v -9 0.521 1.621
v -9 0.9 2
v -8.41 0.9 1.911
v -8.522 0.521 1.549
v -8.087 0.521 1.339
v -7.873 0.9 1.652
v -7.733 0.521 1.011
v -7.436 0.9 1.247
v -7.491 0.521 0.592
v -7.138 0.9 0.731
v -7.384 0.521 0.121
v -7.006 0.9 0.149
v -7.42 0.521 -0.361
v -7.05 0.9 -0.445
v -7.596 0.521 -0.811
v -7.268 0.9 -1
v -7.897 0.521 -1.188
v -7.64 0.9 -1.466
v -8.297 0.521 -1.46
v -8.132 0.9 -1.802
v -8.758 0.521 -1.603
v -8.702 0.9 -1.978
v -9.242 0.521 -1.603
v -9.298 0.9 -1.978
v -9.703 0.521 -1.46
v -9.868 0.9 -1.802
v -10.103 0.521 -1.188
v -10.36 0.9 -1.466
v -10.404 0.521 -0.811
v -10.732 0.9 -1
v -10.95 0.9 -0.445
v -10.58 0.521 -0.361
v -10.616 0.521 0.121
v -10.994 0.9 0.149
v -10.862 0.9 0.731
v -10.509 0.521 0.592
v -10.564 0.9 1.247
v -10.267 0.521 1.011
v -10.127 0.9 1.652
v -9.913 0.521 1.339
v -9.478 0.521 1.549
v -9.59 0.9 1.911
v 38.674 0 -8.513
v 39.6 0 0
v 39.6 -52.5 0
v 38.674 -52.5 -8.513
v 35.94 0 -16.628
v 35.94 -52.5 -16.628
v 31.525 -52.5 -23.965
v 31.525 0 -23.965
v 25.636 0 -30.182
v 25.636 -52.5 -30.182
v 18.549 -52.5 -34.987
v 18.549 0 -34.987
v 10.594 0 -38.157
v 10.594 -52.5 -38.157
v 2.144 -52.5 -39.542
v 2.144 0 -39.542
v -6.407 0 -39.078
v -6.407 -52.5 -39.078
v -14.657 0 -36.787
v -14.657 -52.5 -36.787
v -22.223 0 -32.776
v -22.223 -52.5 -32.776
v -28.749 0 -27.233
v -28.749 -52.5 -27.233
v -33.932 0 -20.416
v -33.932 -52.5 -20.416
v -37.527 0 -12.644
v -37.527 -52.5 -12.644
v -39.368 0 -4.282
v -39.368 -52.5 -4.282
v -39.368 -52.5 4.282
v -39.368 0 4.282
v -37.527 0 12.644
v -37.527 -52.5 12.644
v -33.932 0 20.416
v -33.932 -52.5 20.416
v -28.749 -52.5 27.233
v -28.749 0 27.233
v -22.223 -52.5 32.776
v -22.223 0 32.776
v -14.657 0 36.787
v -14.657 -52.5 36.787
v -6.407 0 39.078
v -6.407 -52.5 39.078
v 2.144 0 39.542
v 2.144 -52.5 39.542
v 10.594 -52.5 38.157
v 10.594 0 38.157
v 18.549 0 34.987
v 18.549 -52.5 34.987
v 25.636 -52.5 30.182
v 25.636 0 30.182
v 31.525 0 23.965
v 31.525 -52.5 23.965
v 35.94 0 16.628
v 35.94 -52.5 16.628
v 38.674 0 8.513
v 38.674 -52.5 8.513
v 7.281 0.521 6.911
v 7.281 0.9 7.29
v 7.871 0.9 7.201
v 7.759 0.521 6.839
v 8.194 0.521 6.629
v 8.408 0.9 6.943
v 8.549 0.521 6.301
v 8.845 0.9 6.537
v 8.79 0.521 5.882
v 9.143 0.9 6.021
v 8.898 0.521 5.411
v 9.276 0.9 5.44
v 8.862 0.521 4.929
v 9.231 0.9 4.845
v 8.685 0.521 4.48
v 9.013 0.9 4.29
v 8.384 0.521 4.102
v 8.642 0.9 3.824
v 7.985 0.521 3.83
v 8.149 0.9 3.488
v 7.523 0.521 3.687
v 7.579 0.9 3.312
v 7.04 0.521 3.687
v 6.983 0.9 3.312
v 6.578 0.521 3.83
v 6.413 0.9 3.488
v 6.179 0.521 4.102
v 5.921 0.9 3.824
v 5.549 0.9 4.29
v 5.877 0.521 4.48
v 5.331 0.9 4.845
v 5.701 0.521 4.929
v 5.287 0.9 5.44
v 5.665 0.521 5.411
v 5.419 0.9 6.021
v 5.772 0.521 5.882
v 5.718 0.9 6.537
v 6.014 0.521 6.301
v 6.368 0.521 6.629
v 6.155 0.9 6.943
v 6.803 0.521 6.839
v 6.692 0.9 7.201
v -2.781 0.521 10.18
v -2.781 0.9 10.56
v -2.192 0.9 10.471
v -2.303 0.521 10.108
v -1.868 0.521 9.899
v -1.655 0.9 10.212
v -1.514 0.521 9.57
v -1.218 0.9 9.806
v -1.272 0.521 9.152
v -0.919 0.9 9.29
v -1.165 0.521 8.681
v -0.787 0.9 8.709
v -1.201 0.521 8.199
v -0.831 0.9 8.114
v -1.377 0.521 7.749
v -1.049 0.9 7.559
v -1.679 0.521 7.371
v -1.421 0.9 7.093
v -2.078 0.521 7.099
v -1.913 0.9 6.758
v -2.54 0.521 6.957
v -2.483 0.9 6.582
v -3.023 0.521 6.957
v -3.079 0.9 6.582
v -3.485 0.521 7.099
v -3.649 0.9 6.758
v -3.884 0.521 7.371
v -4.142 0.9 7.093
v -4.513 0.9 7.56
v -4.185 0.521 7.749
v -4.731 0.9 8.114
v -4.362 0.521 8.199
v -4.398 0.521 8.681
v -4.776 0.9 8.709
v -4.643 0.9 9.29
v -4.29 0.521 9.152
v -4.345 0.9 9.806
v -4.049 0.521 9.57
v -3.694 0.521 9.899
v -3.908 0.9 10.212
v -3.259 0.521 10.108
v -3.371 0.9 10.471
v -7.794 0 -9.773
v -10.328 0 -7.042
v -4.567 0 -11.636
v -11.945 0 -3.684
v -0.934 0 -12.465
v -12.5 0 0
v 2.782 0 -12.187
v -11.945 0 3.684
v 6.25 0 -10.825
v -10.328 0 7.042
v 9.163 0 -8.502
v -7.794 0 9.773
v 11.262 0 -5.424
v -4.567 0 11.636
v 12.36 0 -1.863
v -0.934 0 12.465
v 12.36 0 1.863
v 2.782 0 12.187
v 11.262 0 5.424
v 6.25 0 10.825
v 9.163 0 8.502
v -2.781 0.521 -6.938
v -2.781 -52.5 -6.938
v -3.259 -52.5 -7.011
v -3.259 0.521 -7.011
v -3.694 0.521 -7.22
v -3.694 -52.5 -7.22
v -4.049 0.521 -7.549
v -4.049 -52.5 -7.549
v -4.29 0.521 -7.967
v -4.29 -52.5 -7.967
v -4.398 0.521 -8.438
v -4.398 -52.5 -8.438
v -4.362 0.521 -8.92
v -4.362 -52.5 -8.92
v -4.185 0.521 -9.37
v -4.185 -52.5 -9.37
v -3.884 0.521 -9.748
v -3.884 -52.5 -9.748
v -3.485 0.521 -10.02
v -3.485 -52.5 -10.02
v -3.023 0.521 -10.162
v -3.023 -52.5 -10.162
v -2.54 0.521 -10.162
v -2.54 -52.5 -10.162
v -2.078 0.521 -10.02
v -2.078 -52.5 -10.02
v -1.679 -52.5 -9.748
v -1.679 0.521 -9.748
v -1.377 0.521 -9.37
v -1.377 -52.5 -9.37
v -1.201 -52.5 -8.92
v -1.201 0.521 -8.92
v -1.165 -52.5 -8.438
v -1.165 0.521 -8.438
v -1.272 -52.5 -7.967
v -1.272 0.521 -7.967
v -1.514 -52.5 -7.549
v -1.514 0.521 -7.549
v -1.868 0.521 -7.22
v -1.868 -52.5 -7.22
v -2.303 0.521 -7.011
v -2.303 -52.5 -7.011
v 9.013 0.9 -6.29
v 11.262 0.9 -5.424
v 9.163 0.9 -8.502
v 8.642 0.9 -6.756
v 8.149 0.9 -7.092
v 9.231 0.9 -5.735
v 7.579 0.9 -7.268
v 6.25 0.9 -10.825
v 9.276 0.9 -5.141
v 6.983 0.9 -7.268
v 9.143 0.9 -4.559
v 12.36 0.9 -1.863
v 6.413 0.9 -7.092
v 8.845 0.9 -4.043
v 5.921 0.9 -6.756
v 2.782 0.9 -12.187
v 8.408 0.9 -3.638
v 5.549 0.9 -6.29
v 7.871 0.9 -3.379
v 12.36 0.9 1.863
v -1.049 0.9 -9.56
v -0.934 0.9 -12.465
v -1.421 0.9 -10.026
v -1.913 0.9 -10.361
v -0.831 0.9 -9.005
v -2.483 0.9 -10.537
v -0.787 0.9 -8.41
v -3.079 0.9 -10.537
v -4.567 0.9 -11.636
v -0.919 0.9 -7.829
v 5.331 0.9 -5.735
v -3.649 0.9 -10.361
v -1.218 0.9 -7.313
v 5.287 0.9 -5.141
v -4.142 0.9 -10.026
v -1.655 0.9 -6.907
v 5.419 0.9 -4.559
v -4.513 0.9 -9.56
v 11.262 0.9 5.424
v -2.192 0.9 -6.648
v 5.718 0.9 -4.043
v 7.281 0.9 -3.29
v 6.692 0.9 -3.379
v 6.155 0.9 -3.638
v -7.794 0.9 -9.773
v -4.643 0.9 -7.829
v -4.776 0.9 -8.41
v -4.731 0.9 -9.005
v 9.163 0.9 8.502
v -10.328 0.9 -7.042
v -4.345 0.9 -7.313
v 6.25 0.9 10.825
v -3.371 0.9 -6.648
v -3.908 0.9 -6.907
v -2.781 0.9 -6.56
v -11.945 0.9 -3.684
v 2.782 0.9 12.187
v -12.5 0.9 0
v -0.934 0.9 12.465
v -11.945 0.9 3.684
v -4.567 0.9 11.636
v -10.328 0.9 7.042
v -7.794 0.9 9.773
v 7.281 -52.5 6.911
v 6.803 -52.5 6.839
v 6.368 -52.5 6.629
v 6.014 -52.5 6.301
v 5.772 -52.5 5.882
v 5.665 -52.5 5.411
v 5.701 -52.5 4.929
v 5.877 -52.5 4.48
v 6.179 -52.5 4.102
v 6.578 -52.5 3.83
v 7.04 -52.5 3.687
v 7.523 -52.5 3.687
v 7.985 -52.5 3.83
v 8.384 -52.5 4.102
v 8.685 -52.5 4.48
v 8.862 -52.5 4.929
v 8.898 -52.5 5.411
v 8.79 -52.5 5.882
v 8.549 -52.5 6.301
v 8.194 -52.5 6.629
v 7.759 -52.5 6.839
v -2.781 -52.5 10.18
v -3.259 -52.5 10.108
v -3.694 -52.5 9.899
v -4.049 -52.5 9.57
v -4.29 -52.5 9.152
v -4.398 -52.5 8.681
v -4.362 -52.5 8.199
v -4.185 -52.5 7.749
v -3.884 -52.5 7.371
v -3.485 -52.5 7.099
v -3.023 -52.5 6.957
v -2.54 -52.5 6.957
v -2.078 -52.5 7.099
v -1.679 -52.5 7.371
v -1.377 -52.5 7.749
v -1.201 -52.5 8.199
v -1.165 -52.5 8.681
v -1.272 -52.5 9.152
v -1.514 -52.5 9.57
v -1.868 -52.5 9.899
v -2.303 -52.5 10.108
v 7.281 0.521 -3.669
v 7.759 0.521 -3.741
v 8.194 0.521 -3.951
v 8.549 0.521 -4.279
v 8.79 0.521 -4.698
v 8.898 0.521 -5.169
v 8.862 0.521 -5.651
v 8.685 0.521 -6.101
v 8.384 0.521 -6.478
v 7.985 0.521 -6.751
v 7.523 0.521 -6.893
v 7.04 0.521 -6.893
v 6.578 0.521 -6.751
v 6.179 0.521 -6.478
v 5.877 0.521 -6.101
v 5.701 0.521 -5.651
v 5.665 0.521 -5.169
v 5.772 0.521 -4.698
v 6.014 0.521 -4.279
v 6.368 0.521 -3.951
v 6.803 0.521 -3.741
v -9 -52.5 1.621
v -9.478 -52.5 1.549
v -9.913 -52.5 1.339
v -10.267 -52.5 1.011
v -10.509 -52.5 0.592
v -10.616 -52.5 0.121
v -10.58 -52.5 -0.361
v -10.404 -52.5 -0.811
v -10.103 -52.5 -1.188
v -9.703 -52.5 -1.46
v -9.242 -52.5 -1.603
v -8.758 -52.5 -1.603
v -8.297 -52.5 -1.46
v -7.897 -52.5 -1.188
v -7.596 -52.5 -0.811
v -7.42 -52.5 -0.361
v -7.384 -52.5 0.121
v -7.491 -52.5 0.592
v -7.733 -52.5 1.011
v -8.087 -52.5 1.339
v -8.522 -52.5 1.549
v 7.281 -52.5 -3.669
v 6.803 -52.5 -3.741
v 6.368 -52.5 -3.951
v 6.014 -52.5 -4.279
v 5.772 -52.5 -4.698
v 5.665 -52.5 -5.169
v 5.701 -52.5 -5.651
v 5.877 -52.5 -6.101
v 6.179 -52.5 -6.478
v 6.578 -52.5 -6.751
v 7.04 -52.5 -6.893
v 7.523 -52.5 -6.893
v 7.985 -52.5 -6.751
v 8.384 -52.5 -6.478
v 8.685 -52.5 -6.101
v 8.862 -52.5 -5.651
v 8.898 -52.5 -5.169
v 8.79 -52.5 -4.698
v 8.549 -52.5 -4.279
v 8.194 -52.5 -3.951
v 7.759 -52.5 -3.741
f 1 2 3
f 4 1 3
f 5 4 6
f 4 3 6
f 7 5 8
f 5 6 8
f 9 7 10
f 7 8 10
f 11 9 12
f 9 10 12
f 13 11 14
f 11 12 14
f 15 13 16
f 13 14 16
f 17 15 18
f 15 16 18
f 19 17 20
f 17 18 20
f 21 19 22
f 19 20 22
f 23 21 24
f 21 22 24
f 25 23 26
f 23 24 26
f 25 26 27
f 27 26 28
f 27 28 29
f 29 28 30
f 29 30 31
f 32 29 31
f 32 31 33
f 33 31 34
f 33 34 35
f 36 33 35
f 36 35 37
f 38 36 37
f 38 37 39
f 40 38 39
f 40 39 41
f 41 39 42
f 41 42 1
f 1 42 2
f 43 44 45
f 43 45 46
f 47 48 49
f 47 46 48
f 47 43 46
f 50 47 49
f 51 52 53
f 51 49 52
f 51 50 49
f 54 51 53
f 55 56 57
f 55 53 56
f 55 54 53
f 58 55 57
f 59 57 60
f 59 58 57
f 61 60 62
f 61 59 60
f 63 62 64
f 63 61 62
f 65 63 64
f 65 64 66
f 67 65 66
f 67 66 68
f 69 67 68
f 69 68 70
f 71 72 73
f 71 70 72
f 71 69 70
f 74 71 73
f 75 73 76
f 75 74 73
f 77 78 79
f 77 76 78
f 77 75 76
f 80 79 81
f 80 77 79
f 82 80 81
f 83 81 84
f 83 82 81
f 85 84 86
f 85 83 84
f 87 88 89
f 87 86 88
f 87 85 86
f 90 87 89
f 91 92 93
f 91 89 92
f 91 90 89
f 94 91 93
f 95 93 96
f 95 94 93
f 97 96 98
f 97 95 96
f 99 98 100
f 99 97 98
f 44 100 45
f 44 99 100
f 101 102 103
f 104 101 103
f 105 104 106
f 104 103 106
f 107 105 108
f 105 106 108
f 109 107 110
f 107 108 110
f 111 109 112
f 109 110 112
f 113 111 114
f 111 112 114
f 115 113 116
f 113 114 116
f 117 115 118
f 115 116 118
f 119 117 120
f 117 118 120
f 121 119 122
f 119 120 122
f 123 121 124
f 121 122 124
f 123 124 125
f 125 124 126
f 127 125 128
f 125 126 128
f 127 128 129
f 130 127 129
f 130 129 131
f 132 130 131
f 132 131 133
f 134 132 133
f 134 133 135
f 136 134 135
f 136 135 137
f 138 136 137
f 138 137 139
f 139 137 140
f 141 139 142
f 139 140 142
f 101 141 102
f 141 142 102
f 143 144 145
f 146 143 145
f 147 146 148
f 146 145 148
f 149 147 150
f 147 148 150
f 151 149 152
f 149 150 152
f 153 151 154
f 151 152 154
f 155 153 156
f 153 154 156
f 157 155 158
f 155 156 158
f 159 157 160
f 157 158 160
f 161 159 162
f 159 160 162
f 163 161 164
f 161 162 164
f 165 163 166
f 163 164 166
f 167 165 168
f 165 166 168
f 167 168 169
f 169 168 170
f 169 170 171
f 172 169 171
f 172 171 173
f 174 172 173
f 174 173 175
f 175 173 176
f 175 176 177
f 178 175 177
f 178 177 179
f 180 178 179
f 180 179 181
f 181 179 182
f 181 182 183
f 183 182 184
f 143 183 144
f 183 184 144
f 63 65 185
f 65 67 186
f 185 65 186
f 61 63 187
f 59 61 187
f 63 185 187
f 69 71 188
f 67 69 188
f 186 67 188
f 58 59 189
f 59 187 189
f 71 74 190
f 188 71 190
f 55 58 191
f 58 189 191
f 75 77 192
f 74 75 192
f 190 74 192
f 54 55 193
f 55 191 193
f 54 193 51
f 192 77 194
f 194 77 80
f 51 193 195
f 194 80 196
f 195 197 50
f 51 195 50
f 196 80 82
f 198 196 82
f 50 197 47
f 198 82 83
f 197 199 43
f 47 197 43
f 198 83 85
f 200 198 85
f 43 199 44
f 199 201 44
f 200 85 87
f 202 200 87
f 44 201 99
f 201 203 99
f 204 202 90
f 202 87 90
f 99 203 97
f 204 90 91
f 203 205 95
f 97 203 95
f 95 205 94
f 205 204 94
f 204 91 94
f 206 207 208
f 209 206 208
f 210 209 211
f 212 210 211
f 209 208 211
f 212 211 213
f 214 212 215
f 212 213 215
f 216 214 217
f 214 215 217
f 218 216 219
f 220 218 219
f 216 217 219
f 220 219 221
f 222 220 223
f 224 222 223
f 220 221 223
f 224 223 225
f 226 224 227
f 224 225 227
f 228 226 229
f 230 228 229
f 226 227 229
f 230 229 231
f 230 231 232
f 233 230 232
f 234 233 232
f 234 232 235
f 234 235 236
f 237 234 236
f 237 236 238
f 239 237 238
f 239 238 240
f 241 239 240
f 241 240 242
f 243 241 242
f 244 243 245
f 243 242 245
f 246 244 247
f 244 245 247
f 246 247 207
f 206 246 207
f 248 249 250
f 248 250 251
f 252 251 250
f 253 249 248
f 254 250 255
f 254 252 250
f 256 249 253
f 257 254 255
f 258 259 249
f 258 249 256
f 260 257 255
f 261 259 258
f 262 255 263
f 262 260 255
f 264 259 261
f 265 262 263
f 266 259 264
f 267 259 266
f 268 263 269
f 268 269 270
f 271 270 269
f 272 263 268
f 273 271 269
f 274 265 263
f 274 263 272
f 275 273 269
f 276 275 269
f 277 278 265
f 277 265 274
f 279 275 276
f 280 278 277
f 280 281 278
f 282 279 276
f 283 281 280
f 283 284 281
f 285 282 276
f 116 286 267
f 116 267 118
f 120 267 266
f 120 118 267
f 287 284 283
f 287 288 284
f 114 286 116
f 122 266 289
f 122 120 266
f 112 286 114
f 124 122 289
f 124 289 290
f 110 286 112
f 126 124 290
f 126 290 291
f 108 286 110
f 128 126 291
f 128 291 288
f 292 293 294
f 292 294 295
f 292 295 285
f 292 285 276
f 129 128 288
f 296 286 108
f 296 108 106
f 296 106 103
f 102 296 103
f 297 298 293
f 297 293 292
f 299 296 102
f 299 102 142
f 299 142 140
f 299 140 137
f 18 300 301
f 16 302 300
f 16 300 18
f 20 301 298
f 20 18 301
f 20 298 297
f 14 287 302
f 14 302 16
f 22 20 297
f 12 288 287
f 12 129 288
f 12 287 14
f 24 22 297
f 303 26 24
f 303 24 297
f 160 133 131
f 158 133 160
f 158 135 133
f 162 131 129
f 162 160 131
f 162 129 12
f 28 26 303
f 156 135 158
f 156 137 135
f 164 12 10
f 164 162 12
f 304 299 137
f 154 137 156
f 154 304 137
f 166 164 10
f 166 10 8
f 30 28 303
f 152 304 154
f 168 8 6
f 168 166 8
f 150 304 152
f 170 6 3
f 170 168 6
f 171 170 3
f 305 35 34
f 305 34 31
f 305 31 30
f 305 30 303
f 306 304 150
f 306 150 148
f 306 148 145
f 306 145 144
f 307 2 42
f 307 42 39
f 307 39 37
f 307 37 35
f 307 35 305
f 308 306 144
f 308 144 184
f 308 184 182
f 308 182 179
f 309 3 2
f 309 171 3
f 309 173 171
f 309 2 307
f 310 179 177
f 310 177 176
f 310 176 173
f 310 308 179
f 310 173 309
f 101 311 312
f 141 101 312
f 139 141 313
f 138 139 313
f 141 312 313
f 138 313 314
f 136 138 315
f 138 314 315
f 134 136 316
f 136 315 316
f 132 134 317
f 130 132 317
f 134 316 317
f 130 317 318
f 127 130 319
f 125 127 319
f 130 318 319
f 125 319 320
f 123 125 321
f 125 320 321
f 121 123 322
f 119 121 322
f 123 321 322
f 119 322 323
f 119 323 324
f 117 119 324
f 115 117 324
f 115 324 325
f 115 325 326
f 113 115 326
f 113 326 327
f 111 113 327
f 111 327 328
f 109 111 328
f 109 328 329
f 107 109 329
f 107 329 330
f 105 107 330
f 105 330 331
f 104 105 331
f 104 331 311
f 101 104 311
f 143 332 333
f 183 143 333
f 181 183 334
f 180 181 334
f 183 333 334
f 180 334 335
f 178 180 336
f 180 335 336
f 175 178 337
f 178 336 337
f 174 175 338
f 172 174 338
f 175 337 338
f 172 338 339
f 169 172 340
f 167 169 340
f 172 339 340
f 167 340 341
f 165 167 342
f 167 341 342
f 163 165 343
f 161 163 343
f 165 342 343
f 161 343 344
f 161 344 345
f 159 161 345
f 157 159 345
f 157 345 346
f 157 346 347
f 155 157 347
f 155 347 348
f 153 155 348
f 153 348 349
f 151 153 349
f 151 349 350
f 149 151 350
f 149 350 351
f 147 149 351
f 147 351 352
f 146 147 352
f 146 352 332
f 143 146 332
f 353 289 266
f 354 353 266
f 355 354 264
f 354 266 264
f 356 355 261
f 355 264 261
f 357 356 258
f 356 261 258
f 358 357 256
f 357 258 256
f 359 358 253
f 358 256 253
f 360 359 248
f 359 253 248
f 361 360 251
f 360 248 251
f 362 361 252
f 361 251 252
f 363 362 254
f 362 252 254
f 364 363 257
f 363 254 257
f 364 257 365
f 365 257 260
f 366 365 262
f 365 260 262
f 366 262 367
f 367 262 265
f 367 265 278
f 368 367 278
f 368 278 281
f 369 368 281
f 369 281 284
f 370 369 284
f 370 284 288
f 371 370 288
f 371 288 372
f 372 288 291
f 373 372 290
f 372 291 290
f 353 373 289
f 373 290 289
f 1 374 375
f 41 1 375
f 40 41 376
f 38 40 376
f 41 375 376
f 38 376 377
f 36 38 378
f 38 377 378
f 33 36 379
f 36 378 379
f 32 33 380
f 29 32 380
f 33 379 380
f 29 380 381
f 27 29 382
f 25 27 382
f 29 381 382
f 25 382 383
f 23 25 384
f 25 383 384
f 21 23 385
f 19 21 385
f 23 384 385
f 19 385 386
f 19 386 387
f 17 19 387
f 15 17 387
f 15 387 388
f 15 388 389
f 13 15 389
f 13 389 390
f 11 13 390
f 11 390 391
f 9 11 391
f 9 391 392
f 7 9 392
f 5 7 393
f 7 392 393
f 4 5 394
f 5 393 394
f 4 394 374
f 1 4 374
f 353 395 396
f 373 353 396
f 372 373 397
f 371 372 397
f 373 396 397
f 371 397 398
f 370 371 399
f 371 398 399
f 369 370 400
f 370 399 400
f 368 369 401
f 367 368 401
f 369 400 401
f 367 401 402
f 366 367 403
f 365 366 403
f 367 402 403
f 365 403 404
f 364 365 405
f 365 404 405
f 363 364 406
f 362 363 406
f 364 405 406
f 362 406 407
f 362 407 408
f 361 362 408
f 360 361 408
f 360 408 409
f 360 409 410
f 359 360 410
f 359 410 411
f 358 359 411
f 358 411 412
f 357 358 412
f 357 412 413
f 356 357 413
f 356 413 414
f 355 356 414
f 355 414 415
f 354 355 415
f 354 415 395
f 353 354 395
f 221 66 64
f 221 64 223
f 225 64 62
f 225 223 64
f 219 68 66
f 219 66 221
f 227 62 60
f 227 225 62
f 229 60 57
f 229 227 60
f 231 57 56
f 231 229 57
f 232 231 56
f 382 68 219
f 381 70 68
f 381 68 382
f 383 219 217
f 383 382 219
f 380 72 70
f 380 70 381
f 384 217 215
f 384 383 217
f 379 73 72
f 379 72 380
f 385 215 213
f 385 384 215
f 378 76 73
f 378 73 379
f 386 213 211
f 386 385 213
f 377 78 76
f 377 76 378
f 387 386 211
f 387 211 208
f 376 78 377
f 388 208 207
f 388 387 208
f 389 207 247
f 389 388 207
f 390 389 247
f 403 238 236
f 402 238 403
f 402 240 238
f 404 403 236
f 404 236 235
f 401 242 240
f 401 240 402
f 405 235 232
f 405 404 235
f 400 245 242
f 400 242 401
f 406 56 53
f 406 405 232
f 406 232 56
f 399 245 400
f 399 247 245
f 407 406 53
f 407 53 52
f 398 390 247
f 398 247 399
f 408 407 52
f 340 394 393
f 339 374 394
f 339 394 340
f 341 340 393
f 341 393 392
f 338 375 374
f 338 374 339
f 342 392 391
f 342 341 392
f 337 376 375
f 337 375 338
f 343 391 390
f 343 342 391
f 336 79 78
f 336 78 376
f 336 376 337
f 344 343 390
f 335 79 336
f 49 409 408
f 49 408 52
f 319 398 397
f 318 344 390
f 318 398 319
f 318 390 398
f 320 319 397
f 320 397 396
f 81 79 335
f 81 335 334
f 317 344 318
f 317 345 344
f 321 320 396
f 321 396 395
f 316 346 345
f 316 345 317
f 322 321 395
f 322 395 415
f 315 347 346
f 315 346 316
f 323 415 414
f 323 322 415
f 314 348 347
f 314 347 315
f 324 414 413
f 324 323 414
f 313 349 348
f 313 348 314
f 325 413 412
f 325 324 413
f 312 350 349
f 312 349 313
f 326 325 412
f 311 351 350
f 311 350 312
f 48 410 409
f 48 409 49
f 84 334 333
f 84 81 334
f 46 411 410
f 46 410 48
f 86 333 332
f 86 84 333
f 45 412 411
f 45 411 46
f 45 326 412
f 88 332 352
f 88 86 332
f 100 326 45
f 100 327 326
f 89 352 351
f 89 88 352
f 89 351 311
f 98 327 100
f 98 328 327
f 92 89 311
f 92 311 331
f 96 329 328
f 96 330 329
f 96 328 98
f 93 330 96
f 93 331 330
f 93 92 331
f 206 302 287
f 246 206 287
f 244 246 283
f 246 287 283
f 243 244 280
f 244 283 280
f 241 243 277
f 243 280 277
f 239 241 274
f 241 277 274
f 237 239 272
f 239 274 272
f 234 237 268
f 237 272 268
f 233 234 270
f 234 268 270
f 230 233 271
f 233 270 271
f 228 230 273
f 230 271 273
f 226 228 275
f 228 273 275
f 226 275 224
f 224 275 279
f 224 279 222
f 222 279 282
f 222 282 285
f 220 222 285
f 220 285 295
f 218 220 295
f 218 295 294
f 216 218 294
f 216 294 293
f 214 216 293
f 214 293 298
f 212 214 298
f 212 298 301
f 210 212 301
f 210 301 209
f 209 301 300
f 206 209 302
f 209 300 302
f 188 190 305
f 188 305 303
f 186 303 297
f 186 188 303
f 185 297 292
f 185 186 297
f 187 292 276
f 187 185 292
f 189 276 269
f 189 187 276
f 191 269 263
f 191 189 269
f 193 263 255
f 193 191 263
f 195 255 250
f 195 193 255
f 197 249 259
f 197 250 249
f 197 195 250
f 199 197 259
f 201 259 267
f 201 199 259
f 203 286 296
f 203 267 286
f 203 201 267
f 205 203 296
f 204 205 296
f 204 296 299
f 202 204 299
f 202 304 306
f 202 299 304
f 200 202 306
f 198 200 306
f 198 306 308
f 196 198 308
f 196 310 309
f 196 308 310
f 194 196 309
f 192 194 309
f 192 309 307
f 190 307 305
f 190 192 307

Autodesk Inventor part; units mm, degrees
ref_plane "XZ Plane" through (0, 0, 0) normal (0, 1, 0) x (-1, 0, 0)
sketch "Sketch1" plane through (0, 0, 0) normal (0, 1, 0) x (-1, 0, 0)
  circle A0 centre (0, 0) radius 12.5
  dimension "d0" = 25
extrude "Extrusion1" add sketch "Sketch1" along normal blind 0.9
sketch "Sketch2" plane through (0, 0, 0) normal (0, -1, 0) x (1, 0, 0)
  circle A0 centre (0, 0) radius 39.6
  dimension "d3" = 79.2
extrude "Extrusion2" add sketch "Sketch2" along normal blind 52.5
sketch "Sketch3" plane through (0, 0.9, 0) normal (0, 1, 0) x (1, 0, 0)
  line L0 (0, 0) -> (-9, 0) construction
  circle A0 centre (0, 0) radius 9 construction
  point P0 (-2.7812, -8.5595)
  point P1 (7.2812, -5.2901)
  point P2 (7.2812, 5.2901)
  point P3 (-2.7812, 8.5595)
  point P4 (-2.7812, 8.5595)
  point P5 (7.2812, 5.2901)
  point P6 (7.2812, -5.2901)
  point P7 (-2.7812, -8.5595)
  dimension "d6" = 18
  dimension "d9" = 360
hole "Hole2" at (-9, 0.9, 0) at (-2.7812, 0.9, -8.5595) at (7.2812, 0.9, -5.2901) at (7.2812, 0.9, 5.2901) at (-2.7812, 0.9, 8.5595) direction (0, -1, 0) diameter 3.242 end through all countersink diameter 4 countersink angle 90 thread size "M4x0.7" class "6H" standard "ISO Metric profile"
sketch "Sketch4" plane through (0, 0, 0) normal (0, 0, 1) x (1, 0, 0)
  line L0 (18.2808, -210.8501) -> (-19.3069, -224.5309)
  line L1 (-19.3069, -224.5309) -> (-18.2808, -227.3499)
  line L2 (-18.2808, -227.3499) -> (19.3069, -213.6691)
  line L3 (19.3069, -213.6691) -> (18.2808, -210.8501)
  line L4 (18.2808, -210.8501) -> (-18.2808, -227.3499) construction
  line L5 (-19.3069, -224.5309) -> (19.3069, -213.6691) construction
  line L6 (12.5, 0.9) -> (-12.5, 0.9) construction
  line L7 (0, 0.9) -> (0, -219.1) construction
  point P0 (0, 0)
  dimension "d25" = 40
  dimension "d27" = 3
  dimension "d28" = 70
  dimension "d29" = 220
sketch "Sketch5" plane through (19.3069, -213.6691, -20) normal (0.342, -0.9397, 0) x (0.9397, 0.342, 0)
  line L0 (0, 0) -> (0, 40) projected
  line L1 (0, 20) -> (-20, 20) construction
  line L2 (-20, 20) -> (-20, 0) construction
  line L3 (0, 0) -> (-40, 0) projected
  circle A0 centre (-20, 20) radius 15
  point P0 (54.9366, 20)
  dimension "d32" = 30
properties part number "CH_01_0044_motor_end"
